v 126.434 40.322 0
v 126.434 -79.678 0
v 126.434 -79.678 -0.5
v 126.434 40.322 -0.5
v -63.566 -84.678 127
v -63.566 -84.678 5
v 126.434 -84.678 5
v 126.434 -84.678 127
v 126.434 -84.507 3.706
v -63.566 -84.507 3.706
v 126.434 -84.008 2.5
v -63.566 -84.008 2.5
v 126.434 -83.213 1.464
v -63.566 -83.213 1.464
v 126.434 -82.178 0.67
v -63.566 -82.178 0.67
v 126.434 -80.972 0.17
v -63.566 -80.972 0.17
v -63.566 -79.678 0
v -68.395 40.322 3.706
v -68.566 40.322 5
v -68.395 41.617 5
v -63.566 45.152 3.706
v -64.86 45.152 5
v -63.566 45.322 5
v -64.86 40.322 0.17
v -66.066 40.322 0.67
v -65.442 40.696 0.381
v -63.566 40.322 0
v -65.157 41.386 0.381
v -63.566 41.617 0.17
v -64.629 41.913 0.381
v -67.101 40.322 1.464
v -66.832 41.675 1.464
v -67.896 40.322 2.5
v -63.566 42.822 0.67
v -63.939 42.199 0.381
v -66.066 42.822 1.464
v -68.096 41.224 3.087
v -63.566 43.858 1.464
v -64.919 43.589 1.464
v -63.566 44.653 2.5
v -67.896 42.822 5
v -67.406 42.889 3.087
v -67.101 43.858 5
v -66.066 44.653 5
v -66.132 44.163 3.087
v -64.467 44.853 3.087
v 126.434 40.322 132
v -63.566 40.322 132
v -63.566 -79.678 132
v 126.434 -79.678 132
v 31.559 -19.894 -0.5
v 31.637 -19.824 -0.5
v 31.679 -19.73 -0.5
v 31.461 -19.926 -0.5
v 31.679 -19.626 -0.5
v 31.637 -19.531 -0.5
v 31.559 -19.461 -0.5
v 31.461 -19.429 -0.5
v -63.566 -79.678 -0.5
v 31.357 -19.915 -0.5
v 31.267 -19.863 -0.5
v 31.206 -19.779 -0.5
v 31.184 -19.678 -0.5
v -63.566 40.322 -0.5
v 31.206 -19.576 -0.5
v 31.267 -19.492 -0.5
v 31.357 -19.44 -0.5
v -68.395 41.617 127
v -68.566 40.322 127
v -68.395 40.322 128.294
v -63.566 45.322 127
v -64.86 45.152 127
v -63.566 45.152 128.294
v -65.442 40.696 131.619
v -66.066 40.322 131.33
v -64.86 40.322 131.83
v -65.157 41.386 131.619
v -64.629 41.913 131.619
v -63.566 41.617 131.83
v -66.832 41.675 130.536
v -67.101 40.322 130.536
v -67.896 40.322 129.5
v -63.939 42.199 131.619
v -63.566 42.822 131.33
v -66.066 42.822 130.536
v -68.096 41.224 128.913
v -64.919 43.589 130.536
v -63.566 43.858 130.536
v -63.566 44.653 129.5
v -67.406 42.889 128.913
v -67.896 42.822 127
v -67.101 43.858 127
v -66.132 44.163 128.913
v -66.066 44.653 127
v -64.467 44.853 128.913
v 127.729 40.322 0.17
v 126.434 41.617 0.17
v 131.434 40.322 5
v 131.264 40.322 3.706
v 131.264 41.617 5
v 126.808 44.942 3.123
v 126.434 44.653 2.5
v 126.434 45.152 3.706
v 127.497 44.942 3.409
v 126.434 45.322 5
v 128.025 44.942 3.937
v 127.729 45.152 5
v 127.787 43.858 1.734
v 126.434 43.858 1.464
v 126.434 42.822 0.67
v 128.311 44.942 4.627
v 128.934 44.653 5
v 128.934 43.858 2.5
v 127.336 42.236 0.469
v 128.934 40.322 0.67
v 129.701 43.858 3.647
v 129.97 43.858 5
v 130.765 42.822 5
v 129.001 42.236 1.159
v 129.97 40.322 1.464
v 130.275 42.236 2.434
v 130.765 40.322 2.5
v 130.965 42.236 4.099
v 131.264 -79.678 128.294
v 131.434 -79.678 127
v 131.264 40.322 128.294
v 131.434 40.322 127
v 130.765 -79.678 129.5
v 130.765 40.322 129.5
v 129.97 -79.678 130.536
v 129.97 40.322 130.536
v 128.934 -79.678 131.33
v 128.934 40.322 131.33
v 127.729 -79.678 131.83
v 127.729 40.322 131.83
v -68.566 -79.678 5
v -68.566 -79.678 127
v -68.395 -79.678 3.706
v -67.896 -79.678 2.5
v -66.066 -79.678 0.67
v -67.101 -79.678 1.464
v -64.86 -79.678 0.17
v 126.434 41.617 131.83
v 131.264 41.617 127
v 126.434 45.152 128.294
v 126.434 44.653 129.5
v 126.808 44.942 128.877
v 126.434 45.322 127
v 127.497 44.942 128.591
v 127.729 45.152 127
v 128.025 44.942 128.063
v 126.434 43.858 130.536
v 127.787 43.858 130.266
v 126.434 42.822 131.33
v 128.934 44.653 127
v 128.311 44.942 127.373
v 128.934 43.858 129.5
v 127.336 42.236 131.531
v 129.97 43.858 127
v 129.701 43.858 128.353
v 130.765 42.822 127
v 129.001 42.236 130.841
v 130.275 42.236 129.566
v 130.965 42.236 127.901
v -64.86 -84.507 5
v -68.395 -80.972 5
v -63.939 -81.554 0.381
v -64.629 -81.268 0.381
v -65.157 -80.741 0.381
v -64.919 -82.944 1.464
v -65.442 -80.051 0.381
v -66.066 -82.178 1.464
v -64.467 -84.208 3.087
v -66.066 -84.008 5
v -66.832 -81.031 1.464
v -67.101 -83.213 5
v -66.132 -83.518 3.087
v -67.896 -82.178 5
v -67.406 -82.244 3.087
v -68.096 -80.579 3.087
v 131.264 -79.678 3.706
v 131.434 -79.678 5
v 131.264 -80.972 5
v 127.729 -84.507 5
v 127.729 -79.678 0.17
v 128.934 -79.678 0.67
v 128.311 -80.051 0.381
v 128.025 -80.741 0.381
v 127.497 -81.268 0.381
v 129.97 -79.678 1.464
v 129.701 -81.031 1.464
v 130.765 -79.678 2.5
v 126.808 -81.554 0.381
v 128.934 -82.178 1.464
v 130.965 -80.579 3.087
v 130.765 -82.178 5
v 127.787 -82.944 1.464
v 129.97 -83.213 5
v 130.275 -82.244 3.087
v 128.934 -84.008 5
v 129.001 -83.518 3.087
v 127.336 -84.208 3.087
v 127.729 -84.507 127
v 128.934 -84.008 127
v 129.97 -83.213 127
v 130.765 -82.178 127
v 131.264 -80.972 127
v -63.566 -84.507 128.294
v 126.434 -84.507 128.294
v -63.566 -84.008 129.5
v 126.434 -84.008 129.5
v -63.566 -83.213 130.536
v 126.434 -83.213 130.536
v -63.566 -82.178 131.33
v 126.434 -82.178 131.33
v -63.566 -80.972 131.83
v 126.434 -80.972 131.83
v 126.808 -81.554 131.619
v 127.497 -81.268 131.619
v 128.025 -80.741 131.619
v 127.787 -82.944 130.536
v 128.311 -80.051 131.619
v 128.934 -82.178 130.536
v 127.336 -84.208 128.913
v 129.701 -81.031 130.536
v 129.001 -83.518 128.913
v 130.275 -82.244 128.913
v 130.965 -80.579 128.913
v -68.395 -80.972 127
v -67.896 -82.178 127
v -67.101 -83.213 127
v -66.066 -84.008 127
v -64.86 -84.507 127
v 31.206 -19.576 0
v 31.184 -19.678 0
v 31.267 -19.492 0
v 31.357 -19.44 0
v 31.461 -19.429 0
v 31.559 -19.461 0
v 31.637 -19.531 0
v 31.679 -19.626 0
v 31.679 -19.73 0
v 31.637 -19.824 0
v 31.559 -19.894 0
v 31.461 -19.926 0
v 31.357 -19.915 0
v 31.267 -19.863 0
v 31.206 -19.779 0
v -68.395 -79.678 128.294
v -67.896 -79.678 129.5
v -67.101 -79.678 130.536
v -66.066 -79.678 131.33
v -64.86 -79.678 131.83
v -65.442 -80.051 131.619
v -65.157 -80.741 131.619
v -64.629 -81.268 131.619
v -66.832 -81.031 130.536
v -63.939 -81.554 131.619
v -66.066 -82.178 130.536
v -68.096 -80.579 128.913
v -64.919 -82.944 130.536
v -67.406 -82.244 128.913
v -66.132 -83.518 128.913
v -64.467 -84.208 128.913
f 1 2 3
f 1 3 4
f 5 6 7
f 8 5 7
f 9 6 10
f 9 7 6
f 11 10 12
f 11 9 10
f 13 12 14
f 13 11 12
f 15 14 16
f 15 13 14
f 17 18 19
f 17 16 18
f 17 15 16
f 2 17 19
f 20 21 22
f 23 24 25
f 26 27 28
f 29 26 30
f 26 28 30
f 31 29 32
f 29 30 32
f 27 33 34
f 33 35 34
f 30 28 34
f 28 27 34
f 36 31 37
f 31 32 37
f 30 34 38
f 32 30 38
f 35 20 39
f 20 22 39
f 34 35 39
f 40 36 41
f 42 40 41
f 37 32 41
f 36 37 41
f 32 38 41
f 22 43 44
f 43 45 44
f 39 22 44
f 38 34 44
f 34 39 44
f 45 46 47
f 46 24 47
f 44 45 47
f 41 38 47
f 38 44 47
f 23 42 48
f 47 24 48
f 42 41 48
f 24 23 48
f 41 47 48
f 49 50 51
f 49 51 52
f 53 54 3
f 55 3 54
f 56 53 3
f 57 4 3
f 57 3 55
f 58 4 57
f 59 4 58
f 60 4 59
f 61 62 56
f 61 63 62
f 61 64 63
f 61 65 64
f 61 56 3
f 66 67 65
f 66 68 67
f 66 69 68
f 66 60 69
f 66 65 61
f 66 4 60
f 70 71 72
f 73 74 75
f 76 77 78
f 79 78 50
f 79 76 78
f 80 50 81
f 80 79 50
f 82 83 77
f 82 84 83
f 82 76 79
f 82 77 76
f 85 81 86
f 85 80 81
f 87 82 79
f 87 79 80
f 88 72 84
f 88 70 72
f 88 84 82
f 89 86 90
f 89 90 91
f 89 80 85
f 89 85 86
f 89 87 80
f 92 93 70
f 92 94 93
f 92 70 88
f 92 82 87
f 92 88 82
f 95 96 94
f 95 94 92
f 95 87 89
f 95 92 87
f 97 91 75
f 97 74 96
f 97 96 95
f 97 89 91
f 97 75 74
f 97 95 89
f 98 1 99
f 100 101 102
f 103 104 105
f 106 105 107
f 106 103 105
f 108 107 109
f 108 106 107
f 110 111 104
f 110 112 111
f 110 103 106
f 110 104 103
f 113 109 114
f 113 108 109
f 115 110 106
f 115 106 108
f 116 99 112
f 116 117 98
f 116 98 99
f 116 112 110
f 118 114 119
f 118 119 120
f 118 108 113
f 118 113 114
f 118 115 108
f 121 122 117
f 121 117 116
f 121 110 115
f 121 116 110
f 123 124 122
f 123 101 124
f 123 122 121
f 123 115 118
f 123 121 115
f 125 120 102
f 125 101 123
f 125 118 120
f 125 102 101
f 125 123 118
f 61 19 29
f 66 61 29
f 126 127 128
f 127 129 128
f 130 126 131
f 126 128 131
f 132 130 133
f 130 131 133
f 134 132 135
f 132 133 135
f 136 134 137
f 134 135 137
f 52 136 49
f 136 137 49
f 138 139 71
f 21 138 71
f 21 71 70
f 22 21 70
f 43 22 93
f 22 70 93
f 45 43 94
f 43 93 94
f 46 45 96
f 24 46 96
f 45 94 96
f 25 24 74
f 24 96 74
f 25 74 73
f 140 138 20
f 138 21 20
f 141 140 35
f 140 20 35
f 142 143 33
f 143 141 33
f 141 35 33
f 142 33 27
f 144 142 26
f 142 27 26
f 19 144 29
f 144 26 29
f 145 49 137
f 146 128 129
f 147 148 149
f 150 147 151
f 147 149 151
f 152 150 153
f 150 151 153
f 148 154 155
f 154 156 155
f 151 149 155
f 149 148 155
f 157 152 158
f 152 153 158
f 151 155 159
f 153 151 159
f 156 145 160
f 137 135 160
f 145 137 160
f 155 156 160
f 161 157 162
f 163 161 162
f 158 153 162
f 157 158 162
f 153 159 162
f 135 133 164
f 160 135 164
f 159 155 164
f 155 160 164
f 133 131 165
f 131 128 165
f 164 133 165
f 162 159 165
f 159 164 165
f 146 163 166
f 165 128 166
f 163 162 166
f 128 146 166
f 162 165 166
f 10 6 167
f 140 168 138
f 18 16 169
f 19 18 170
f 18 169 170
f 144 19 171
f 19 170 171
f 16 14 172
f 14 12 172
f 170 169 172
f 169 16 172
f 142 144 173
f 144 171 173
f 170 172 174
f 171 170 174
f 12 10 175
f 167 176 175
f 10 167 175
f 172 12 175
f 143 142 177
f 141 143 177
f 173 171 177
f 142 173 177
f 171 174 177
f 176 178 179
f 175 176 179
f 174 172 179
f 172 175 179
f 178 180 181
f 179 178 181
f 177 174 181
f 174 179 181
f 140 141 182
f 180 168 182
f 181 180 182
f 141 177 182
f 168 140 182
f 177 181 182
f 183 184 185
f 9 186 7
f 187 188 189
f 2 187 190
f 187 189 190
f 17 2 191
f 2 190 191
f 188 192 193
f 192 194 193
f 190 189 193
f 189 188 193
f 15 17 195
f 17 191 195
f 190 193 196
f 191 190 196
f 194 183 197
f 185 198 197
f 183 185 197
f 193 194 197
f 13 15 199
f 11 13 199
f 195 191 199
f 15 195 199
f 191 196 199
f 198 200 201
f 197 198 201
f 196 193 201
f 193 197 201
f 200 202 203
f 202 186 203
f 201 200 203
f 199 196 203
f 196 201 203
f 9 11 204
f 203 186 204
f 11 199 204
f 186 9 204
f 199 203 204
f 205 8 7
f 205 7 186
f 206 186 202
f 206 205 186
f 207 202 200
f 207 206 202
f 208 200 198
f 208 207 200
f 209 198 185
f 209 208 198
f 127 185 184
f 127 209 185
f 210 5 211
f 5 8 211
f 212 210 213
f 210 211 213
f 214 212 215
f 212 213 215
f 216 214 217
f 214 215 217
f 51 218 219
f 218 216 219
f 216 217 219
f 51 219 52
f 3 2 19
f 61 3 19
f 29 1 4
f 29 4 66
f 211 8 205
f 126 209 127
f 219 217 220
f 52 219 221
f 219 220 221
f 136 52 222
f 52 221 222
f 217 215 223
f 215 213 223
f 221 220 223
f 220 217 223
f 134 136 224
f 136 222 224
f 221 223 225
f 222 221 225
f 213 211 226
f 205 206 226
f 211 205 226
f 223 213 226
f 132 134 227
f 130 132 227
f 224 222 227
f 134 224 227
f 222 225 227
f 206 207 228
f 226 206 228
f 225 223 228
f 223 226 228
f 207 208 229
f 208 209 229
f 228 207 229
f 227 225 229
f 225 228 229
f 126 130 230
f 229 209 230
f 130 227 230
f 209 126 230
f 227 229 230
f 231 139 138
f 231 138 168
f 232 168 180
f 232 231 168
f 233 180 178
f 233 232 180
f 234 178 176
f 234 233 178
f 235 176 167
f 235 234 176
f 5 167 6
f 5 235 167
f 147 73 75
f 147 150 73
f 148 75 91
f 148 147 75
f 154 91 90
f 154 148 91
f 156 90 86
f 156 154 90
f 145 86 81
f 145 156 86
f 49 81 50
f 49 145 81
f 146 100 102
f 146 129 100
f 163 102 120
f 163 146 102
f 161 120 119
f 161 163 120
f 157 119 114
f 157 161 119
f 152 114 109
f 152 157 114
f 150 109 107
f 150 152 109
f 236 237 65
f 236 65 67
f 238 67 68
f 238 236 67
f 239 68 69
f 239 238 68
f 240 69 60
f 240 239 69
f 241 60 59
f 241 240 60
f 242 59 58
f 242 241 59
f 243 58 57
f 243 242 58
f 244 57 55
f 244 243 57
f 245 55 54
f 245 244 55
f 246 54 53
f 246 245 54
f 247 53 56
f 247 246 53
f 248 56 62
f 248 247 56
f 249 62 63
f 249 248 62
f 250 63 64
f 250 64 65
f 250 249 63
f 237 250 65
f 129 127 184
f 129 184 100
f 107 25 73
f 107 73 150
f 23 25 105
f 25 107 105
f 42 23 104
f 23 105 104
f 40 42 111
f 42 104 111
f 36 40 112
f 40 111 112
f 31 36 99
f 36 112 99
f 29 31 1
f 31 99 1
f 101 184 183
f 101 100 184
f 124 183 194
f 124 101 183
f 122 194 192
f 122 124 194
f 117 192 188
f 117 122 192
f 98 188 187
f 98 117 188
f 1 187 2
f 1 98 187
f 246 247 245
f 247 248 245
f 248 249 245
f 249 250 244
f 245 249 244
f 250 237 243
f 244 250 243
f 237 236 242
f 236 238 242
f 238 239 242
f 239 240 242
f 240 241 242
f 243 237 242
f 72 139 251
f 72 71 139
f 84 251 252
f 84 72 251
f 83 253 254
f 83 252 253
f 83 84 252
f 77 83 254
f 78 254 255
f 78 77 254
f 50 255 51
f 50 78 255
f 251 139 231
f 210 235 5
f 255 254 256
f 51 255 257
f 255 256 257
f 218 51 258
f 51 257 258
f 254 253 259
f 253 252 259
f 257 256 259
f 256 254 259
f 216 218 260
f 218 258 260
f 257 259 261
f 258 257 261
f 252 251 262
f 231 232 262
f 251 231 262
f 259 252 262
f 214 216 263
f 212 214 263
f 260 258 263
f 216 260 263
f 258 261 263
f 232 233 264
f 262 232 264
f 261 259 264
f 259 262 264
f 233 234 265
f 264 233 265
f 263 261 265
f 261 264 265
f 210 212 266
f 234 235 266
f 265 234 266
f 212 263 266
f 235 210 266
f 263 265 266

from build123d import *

# Parameters (mm, degrees)
SKETCH1_W           = 200
SKETCH1_H           = 130
BOSS_EXTRUDE1_DEPTH = 132
FILLET1_R           = 5
SKETCH2_W           = 190
SKETCH2_H           = 120
SKETCH2_R           = 0.25
BOSS_EXTRUDE2_DEPTH = 0.5


with BuildPart() as part:
    # Sketch1 → Boss-Extrude1 (new body)
    with BuildSketch(Plane.XY):
        with Locations((31.434425269, -19.677523207)):
            Rectangle(SKETCH1_W, SKETCH1_H)
    extrude(amount=BOSS_EXTRUDE1_DEPTH)

    # Fillet1
    fillet1_edges = [part.edges().sort_by_distance(p)[0] for p in [
        (131.434425269, -84.677523207, 66),
        (-68.565574731, -84.677523207, 66),
        (-68.565574731, 45.322476793, 66),
        (-68.565574731, -19.677523207, 132),
        (31.434425269, -84.677523207, 132),
        (131.434425269, -19.677523207, 132),
        (31.434425269, 45.322476793, 132),
        (131.434425269, -19.677523207, 0),
        (31.434425269, -84.677523207, 0),
        (-68.565574731, -19.677523207, 0),
        (31.434425269, 45.322476793, 0),
        (131.434425269, 45.322476793, 66),
    ]]
    fillet(fillet1_edges, radius=FILLET1_R)

    # Sketch2 → Boss-Extrude2 (add)
    with BuildSketch(Plane(origin=(0, 0, 0), x_dir=(-1, 0, 0), z_dir=(0, 0, -1))):
        with Locations((-31.434425269, -19.677523207)):
            Rectangle(SKETCH2_W, SKETCH2_H)
        with Locations((-31.434425269, -19.677523207)):
            Circle(SKETCH2_R, mode=Mode.SUBTRACT)
    extrude(amount=BOSS_EXTRUDE2_DEPTH)


solid = part.part
